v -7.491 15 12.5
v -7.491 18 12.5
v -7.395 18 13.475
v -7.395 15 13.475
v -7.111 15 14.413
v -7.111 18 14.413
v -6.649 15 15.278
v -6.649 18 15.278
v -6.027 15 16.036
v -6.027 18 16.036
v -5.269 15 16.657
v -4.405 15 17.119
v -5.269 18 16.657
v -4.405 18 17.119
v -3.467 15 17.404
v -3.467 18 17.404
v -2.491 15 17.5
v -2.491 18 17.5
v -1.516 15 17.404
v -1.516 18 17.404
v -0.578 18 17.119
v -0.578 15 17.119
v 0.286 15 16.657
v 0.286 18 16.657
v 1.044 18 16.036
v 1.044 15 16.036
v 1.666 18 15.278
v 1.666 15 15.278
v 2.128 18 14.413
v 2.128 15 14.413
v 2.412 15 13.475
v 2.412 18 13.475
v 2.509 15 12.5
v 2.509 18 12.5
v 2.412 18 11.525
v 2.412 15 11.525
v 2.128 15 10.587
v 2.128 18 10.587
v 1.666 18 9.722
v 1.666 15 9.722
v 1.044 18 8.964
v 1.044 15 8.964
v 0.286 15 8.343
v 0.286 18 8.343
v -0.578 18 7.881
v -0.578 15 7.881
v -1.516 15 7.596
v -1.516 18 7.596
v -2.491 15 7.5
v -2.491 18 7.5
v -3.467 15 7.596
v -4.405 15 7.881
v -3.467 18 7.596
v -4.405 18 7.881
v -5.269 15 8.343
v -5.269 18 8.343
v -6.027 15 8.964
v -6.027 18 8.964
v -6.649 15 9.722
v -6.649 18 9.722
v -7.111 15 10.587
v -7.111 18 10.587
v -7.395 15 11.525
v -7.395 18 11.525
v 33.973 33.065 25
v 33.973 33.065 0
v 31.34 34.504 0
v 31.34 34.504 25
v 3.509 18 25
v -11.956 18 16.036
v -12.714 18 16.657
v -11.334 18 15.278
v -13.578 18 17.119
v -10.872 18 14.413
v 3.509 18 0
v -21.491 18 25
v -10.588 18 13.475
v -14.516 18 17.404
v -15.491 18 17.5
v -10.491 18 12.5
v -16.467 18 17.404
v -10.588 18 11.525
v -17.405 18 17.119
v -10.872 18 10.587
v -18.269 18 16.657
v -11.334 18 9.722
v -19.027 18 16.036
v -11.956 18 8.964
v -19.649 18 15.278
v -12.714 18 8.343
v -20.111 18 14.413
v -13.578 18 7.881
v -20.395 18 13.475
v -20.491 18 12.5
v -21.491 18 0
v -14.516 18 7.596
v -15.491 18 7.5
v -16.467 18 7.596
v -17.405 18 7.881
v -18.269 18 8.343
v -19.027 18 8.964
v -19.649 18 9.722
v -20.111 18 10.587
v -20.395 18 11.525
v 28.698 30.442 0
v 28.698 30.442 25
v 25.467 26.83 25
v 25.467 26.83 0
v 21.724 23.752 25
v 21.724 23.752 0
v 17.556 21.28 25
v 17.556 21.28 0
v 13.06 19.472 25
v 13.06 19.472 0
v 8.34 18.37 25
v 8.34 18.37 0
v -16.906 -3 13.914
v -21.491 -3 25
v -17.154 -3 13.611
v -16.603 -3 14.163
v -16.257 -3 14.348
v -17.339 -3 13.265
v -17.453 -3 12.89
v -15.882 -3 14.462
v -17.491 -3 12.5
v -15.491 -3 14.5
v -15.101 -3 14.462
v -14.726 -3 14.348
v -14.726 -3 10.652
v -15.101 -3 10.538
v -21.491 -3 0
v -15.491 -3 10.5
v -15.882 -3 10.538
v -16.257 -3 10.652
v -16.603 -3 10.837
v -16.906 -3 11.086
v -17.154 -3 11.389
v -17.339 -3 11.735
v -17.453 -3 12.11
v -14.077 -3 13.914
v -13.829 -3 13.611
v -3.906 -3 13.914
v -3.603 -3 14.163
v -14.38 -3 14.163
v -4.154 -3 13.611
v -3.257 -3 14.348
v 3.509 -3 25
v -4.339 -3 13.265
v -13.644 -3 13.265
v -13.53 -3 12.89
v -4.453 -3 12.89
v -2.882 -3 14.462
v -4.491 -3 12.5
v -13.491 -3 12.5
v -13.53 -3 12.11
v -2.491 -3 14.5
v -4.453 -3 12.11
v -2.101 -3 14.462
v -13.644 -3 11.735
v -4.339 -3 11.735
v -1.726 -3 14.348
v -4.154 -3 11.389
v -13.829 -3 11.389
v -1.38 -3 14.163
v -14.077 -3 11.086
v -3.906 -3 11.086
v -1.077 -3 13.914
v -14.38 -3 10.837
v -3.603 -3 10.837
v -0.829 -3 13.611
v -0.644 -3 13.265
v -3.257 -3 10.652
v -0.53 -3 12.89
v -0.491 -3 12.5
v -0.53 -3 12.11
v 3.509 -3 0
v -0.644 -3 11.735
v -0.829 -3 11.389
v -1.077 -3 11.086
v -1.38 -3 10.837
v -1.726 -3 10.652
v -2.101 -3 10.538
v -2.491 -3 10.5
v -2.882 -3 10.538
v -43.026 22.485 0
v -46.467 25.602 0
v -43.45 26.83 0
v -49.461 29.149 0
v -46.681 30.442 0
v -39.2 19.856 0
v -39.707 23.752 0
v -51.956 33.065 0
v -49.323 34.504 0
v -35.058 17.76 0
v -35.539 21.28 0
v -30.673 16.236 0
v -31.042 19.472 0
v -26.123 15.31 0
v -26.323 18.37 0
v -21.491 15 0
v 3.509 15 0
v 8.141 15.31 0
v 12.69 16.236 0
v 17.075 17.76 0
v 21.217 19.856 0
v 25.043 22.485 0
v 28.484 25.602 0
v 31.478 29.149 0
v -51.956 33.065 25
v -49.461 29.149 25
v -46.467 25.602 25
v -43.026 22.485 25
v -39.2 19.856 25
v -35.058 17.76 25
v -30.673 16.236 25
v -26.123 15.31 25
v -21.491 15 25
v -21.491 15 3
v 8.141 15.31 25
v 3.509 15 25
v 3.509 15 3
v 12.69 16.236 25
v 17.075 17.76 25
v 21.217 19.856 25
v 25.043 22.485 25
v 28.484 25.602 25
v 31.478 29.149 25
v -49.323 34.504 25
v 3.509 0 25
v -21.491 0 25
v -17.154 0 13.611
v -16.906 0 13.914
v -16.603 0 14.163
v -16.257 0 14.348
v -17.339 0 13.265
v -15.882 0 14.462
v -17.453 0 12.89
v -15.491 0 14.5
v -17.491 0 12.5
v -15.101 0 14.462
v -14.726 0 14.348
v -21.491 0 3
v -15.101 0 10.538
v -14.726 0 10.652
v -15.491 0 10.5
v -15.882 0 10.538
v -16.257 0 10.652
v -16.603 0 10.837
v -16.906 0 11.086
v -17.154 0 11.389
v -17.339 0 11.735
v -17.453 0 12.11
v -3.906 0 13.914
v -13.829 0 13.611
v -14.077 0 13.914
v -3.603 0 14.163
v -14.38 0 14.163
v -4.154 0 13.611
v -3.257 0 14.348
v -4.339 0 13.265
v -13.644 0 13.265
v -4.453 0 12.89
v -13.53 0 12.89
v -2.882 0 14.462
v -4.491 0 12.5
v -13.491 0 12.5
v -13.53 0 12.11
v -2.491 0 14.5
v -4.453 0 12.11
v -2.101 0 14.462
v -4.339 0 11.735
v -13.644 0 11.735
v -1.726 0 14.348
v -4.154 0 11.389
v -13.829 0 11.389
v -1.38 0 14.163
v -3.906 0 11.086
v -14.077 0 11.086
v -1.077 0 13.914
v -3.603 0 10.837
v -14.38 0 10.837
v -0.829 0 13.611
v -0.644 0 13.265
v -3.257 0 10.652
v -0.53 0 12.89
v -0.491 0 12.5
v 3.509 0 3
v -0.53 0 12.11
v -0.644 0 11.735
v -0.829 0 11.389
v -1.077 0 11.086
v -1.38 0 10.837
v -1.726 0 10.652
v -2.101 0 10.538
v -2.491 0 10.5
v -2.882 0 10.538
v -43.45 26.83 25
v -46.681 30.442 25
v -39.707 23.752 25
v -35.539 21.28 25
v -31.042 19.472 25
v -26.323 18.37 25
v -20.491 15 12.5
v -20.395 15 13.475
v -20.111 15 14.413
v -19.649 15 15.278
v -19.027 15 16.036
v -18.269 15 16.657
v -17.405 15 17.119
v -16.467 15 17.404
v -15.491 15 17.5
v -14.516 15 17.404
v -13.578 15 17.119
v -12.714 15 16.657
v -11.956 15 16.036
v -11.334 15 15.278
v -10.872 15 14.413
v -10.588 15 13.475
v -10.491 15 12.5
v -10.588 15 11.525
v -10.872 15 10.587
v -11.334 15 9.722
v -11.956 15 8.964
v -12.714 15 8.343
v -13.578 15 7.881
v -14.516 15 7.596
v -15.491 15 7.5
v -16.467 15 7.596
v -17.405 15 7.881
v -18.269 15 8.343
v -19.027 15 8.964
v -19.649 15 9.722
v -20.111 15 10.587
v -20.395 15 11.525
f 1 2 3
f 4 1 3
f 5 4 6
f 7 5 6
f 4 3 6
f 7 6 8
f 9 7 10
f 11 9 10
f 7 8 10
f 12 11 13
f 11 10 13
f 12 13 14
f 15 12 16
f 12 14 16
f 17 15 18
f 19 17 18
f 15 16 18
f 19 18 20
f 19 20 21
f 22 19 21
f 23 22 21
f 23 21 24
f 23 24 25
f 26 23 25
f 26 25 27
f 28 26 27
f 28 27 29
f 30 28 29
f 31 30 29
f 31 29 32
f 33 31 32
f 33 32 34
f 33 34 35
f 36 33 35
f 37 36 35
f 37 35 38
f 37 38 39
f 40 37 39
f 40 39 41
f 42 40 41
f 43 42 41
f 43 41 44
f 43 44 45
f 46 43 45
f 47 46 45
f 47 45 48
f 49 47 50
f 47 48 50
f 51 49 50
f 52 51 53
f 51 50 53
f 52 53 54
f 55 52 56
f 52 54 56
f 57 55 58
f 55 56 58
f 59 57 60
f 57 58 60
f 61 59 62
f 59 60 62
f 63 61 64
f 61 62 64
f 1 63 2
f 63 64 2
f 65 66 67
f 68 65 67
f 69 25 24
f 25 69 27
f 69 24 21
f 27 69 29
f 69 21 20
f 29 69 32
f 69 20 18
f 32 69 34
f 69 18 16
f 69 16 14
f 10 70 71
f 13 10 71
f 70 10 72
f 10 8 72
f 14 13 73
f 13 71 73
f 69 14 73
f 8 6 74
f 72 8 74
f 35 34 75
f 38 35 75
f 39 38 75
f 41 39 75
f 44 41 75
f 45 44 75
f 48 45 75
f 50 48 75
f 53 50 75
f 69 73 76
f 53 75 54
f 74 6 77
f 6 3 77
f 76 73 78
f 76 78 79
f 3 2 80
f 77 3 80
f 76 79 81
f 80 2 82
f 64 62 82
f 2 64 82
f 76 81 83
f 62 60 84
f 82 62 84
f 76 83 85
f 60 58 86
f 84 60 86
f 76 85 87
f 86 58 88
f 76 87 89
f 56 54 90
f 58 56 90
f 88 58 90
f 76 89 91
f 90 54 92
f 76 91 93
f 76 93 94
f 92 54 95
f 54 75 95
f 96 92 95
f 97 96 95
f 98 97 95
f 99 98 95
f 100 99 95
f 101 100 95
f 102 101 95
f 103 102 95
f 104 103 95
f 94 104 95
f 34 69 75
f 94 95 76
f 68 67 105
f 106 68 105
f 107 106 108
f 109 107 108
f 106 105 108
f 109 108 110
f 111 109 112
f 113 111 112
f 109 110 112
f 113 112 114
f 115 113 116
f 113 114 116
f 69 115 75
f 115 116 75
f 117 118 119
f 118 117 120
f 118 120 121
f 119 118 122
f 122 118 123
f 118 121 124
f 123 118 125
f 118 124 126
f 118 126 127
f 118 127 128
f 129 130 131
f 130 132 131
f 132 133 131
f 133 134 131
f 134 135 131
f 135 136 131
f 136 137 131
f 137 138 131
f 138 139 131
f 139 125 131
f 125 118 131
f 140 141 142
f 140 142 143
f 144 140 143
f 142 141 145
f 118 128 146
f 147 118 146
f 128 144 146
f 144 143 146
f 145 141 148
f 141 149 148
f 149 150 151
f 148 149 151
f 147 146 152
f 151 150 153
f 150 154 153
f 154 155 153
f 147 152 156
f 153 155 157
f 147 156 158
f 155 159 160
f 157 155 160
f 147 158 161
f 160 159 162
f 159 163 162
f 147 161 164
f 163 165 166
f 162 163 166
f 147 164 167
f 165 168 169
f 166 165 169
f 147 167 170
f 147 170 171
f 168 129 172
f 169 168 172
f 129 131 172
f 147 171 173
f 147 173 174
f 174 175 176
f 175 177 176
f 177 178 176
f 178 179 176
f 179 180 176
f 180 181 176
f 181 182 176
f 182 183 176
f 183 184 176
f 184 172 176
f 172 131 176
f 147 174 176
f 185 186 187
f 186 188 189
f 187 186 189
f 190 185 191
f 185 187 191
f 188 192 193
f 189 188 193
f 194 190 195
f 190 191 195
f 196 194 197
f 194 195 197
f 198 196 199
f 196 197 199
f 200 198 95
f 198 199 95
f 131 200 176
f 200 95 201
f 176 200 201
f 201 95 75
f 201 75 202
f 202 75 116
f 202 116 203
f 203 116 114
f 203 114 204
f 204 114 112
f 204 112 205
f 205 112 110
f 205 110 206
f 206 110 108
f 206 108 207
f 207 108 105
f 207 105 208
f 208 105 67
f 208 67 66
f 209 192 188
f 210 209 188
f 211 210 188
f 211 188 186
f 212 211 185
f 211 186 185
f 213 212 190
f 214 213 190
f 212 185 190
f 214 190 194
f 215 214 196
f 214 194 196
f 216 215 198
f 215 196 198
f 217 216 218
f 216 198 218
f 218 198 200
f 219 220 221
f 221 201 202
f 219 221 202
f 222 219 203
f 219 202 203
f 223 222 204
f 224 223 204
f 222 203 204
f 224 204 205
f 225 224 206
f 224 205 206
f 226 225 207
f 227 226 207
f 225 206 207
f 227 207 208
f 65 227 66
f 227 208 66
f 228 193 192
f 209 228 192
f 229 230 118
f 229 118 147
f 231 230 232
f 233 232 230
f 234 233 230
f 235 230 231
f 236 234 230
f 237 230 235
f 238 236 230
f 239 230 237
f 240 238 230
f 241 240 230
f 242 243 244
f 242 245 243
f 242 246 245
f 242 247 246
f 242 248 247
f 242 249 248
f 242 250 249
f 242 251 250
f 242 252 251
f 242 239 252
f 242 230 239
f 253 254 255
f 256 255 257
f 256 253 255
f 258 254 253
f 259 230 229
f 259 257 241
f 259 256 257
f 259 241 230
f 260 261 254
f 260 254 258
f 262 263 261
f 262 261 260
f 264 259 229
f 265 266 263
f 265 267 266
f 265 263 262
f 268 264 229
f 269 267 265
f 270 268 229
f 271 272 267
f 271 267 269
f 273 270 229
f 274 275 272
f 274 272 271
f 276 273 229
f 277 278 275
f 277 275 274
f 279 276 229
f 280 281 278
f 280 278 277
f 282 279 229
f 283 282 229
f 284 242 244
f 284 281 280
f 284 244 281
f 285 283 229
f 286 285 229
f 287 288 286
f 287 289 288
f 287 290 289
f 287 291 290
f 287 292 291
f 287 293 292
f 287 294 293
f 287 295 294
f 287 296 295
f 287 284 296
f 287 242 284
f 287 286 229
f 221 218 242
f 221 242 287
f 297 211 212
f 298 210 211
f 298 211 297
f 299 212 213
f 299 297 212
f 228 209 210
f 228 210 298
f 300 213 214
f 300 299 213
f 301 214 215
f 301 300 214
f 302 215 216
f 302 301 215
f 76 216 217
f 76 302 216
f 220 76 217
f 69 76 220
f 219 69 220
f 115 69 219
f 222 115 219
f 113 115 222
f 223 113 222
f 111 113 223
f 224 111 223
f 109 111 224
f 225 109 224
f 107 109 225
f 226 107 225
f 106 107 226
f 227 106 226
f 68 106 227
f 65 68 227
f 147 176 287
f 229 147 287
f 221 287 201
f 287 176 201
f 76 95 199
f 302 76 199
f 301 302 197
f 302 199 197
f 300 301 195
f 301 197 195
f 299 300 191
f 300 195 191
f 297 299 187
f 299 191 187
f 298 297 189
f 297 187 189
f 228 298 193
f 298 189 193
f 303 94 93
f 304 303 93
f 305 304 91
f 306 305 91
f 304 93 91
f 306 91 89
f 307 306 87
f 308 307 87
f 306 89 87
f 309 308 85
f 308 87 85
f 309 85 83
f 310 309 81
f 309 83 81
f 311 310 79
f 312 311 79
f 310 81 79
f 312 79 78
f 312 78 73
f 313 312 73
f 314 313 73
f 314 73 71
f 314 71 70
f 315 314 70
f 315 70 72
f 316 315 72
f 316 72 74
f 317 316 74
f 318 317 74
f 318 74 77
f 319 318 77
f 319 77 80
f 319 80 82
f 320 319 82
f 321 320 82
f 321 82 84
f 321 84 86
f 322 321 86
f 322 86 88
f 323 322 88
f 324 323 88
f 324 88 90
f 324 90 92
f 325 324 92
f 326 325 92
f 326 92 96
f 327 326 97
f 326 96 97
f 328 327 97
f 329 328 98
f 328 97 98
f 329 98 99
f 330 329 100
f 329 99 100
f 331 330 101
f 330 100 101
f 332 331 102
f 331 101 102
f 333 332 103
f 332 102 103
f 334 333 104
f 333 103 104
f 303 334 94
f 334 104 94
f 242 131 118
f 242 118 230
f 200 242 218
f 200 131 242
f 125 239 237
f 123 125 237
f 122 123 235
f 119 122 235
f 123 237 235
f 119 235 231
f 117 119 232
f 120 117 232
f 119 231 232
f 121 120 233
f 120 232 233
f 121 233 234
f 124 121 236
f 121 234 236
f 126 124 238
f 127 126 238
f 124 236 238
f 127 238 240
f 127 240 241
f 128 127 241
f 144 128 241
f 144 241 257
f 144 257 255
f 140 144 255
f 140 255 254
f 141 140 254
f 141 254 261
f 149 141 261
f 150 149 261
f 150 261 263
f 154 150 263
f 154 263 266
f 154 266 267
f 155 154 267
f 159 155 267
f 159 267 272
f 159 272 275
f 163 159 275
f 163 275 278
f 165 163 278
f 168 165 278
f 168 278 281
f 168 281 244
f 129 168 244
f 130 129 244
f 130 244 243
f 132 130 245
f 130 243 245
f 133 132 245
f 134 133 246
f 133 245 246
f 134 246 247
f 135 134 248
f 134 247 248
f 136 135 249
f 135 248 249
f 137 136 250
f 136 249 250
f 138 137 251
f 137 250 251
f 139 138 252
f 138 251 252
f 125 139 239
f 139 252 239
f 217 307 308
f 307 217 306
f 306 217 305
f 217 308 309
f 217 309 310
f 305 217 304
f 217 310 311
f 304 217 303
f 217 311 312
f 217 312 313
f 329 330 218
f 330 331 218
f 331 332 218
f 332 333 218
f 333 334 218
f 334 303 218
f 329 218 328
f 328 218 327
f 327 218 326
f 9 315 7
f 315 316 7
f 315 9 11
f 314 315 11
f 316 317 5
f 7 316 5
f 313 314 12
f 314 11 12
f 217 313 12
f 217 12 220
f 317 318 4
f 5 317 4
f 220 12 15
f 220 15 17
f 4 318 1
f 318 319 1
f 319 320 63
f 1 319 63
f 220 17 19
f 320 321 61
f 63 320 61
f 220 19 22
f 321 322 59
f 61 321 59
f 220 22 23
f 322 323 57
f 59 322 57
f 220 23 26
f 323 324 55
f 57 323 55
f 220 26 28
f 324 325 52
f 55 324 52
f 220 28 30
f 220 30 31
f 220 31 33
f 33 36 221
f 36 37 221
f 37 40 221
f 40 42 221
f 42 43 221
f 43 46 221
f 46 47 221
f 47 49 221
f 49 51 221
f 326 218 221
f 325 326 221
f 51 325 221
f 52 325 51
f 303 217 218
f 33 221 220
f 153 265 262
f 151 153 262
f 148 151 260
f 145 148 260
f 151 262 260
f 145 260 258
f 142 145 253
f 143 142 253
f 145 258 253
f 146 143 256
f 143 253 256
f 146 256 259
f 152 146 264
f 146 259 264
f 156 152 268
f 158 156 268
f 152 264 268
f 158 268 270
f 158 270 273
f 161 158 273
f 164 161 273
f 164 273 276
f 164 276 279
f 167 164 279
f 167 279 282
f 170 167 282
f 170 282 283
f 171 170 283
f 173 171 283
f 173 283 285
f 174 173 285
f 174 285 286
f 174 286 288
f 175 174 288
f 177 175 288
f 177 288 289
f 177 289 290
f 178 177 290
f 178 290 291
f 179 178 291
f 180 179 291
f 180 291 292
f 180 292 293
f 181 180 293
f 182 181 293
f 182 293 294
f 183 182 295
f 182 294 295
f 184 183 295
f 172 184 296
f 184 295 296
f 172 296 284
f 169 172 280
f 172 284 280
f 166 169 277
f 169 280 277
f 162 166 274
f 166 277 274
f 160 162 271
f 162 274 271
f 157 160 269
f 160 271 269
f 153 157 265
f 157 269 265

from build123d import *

# Parameters (mm, degrees)
F1_DEPTH = 25
F0_W     = 25
F0_H     = 3
F0_H_2   = 15
F2_DEPTH = 3
F3_R     = 2
F4_DEPTH = 25
F3_R_2   = 5
F5_DEPTH = 10


with BuildPart() as f1:
    # F0 (on Top) → F1 (new body)
    with BuildSketch(Plane.XY):
        with BuildLine():
            ThreePointArc((-51.955607151, 33.064927277), (-39.2002565409, 19.8557934078), (-21.4914605021, 15))
            Line((-21.4914605021, 15), (3.5085394979, 15))
            ThreePointArc((3.5085394979, 15), (21.2173355366, 19.8557934078), (33.9726861467, 33.064927277))
            Line((33.9726861467, 33.064927277), (31.3403677316, 34.5039893887))
            ThreePointArc((31.3403677316, 34.5039893887), (19.687169914, 22.4362184053), (3.5085394979, 18))
            Line((3.5085394979, 18), (-21.4914605021, 18))
            ThreePointArc((-21.4914605021, 18), (-37.6700909183, 22.4362184053), (-49.3232887359, 34.5039893887))
            Line((-49.3232887359, 34.5039893887), (-51.955607151, 33.064927277))
        make_face()
    extrude(amount=F1_DEPTH)



with BuildPart() as f1b:
    # F0 (on Top) → F1, piece 2 (new body)
    with BuildSketch(Plane.XY):
        with Locations((-8.9914605021, -1.5)):
            Rectangle(F0_W, F0_H)
    extrude(amount=F1_DEPTH)


with BuildPart() as f1_1:
    add(f1.part)

    add(f1b.part)  # F2 merges F1b
    # F0 (on Top) → F2 (join)
    with BuildSketch(Plane.XY):
        with Locations((-8.9914605021, 7.5)):
            Rectangle(F0_W, F0_H_2)
    extrude(amount=F2_DEPTH)

    # F3 (on face) → F4 (cut)
    with BuildSketch(Plane(origin=(0, 18, 0), x_dir=(-1, 0, 0), z_dir=(0, 1, 0))):
        with Locations((15.4914605021, 12.5)):
            Circle(F3_R)
        with Locations((2.4914605021, 12.5)):
            Circle(F3_R)
    extrude(amount=-F4_DEPTH, mode=Mode.SUBTRACT)

    # F3 (on face) → F5 (cut)
    with BuildSketch(Plane(origin=(0, 18, 0), x_dir=(-1, 0, 0), z_dir=(0, 1, 0))):
        with Locations((15.4914605021, 12.5)):
            Circle(F3_R_2)
        with Locations((15.4914605021, 12.5)):
            Circle(F3_R, mode=Mode.SUBTRACT)
        with Locations((2.4914605021, 12.5)):
            Circle(F3_R_2)
        with Locations((2.4914605021, 12.5)):
            Circle(F3_R, mode=Mode.SUBTRACT)
    extrude(amount=-F5_DEPTH, mode=Mode.SUBTRACT)


solid = f1_1.part
